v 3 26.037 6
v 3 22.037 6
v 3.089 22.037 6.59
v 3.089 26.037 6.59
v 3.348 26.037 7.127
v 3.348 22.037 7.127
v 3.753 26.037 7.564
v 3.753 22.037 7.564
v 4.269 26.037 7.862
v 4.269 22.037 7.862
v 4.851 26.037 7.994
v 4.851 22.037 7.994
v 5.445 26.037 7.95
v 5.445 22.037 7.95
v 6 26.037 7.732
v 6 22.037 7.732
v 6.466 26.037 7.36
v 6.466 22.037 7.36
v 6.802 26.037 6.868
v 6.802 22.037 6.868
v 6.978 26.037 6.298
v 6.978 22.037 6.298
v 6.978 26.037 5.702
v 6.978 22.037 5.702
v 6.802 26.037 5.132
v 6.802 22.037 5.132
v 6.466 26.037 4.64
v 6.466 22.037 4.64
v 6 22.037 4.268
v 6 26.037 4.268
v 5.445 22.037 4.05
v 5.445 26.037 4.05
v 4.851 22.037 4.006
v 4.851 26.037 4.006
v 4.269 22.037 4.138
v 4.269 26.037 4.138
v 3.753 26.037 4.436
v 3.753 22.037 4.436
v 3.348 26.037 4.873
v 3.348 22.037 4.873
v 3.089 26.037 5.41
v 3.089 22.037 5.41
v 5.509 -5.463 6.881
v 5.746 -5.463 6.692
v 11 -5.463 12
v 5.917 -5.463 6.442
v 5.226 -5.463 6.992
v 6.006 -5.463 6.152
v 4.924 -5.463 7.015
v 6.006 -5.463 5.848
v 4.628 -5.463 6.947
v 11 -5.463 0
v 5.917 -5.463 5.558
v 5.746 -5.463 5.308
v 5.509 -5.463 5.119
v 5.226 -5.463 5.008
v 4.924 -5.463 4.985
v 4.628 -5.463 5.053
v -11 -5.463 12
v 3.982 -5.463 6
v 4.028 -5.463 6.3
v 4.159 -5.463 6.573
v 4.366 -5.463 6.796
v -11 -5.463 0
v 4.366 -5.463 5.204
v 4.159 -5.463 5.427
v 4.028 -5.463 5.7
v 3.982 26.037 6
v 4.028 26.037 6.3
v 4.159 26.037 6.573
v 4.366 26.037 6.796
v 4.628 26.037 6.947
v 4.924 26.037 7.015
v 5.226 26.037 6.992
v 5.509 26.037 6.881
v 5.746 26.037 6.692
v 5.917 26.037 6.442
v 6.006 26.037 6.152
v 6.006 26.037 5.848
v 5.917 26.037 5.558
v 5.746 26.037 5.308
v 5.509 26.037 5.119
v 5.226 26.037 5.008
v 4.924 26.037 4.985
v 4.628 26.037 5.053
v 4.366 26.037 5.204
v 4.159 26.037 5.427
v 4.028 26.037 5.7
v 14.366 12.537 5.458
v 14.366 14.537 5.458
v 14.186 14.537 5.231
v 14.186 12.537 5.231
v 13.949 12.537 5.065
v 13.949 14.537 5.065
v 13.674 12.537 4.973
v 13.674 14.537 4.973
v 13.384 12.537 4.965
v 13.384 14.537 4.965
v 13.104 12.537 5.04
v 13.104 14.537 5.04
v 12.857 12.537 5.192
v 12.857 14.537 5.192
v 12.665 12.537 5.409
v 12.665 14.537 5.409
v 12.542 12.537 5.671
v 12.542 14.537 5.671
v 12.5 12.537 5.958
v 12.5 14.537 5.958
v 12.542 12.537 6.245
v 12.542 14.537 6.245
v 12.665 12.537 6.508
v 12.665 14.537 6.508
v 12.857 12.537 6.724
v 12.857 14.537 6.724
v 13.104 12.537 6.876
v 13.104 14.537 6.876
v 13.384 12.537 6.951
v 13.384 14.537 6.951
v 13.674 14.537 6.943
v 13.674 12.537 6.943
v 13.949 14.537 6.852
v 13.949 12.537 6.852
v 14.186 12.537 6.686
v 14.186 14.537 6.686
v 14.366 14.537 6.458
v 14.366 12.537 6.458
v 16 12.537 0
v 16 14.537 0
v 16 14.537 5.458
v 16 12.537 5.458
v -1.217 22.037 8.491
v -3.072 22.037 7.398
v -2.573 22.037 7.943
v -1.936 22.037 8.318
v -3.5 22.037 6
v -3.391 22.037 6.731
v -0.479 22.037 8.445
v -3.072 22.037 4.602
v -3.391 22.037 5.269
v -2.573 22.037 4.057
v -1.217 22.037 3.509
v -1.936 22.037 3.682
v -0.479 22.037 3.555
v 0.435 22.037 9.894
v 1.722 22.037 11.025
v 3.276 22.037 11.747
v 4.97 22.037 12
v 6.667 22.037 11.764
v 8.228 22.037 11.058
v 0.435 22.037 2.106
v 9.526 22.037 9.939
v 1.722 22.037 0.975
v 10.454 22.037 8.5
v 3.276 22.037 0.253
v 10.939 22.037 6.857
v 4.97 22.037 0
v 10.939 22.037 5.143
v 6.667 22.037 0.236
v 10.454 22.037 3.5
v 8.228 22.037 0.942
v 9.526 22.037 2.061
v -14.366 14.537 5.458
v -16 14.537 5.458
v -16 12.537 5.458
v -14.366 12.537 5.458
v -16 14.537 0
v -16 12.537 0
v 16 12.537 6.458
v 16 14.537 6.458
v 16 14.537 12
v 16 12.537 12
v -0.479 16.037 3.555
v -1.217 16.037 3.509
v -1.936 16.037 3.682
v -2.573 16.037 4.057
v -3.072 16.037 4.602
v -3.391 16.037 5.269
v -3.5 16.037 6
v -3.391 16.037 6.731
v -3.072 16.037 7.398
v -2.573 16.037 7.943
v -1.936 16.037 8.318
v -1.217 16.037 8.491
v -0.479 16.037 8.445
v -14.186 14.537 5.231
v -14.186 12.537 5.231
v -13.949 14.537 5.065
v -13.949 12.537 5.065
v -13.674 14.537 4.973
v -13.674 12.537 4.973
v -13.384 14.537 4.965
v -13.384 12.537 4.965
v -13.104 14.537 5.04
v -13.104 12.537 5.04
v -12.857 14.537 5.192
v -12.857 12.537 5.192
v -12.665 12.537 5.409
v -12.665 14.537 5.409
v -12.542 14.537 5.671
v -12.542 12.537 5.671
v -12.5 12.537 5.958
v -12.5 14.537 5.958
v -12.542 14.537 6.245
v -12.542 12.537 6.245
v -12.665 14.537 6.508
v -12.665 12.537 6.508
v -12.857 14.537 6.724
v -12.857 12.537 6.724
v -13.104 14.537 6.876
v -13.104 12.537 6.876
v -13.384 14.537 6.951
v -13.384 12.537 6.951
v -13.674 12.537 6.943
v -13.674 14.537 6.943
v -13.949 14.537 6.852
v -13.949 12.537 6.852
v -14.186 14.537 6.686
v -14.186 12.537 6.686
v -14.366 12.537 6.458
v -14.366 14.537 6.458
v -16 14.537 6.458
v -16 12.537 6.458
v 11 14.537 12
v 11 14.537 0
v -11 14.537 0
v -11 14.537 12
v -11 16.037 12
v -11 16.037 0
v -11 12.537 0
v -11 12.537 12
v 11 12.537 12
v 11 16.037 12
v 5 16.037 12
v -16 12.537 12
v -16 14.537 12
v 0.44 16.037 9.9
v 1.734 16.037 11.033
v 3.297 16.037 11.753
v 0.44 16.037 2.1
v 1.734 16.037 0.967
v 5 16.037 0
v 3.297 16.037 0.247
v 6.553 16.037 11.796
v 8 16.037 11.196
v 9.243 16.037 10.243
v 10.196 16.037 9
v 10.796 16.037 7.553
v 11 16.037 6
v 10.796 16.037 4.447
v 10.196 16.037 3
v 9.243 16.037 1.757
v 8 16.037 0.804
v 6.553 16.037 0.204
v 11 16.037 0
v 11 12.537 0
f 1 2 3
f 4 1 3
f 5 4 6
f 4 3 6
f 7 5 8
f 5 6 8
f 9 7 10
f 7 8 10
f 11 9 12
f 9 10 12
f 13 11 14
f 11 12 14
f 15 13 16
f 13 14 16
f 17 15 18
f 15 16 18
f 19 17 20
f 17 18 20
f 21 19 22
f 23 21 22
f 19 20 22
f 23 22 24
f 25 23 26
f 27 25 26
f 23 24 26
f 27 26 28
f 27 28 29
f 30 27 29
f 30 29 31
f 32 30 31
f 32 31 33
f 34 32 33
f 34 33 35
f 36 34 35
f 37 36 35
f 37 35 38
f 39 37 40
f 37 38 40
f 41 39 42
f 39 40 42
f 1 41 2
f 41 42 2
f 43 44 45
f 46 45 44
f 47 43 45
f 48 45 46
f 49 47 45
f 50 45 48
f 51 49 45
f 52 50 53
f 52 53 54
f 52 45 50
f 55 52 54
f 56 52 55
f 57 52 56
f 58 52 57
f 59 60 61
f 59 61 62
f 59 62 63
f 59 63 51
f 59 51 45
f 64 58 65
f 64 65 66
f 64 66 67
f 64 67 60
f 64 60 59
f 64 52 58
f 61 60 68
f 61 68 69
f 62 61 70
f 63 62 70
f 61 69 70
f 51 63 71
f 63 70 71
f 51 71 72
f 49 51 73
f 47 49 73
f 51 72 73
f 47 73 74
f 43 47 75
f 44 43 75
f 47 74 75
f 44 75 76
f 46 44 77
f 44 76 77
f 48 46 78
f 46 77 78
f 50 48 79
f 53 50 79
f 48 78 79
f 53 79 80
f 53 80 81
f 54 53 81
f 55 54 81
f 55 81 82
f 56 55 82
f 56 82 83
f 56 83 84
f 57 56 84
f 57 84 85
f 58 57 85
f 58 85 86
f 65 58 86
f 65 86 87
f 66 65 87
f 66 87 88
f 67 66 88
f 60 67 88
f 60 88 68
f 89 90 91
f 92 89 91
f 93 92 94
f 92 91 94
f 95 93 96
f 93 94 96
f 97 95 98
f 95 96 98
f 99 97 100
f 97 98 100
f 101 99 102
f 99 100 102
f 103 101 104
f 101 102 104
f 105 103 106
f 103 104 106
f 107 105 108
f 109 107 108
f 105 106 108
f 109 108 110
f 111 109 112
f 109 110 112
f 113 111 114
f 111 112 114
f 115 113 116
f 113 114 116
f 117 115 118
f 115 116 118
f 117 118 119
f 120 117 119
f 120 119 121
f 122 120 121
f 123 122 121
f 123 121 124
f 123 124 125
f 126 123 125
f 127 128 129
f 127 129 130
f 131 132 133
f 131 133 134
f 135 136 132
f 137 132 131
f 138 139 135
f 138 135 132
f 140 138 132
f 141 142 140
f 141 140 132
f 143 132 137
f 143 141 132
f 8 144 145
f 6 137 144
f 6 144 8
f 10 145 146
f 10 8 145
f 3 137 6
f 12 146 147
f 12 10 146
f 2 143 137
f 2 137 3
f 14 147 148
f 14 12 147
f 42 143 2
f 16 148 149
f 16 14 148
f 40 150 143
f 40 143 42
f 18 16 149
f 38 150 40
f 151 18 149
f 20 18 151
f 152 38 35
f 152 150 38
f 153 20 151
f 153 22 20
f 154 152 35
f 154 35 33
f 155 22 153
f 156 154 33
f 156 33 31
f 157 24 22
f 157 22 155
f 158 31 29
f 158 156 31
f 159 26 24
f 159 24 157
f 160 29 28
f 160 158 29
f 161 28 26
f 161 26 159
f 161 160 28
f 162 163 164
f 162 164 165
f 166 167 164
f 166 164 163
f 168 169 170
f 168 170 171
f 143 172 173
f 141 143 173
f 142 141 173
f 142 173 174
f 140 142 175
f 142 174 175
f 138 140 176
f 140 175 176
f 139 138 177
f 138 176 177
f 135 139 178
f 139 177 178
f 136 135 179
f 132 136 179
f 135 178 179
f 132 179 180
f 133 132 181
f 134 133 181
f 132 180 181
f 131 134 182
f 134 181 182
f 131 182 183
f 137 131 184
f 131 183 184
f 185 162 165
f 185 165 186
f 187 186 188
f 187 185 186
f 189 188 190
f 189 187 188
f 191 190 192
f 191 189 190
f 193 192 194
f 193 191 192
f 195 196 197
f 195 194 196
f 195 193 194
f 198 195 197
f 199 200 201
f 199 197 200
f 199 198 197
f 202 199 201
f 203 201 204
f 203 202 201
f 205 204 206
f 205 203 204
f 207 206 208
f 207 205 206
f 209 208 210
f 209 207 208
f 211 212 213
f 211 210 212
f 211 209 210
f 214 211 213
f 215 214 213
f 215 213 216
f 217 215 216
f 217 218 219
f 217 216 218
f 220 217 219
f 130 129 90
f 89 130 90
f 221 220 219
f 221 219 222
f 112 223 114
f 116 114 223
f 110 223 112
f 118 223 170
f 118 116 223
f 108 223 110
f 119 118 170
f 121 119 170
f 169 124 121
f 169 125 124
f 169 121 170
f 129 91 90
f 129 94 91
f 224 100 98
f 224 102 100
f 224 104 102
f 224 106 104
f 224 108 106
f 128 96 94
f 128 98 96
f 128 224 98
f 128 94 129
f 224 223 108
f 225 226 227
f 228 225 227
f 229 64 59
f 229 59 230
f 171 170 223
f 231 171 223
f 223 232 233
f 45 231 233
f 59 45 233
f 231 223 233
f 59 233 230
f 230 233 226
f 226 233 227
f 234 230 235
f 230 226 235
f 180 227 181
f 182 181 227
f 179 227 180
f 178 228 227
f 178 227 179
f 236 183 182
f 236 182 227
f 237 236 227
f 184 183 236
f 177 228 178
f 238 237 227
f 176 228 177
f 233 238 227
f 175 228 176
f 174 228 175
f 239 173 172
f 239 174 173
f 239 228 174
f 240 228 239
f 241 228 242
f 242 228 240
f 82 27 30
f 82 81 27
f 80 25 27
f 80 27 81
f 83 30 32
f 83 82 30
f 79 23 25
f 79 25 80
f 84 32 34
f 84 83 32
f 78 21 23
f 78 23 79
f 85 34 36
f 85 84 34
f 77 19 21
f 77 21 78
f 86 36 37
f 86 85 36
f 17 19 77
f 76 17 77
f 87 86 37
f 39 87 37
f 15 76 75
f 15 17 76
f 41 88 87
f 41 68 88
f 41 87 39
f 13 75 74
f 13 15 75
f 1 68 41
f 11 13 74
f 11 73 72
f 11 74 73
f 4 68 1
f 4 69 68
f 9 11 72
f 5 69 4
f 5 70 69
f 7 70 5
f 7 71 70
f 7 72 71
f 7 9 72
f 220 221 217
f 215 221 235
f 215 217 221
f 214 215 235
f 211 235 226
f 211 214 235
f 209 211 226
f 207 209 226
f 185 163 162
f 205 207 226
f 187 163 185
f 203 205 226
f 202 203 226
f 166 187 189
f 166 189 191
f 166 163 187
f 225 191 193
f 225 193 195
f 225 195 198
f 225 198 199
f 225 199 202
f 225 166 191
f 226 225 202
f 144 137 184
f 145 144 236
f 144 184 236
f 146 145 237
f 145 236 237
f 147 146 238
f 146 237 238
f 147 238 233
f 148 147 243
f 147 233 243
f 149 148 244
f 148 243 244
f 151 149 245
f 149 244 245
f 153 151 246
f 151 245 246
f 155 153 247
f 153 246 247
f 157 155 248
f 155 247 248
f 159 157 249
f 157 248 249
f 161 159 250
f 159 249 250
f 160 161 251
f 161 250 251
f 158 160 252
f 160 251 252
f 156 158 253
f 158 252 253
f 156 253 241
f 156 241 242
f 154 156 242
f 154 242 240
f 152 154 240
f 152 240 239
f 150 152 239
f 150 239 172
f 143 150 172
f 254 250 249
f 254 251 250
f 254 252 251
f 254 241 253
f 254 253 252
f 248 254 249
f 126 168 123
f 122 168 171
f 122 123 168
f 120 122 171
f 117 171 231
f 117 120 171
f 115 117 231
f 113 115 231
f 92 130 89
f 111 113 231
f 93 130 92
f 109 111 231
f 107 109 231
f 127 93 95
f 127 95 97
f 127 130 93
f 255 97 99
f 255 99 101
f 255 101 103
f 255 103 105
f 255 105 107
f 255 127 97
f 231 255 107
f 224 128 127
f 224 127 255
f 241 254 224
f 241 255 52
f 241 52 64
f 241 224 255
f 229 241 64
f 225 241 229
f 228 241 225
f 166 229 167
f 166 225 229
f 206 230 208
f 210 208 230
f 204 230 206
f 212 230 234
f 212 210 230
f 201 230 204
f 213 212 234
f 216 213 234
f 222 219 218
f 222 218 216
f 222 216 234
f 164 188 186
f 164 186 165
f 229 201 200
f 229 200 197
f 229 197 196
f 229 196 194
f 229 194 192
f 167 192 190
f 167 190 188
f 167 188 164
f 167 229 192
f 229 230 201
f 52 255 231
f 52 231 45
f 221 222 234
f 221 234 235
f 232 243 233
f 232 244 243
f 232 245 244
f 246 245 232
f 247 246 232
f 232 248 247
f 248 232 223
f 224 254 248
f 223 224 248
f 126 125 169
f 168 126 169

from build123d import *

# Parameters (mm, degrees)
EXTRUDE_1_DEPTH     = 12
EXTRUDE_3_DEPTH     = 6
SKETCH_4_R          = 2
EXTRUDE_4_DEPTH     = 4
CUT_EXTRUDE_2_DEPTH = 29.284271247
SKETCH_6_R          = 1.017604249
CUT_EXTRUDE_3_DEPTH = 38.312866414


with BuildPart() as part:
    # 草图1 → 凸台-拉伸1 (new body)
    with BuildSketch(Plane.XY):
        Polygon((-11, 12.536842105), (-16, 12.536842105), (-16, 14.536842105), (-11, 14.536842105), (-11, 16.036842105), (11, 16.036842105), (11, 14.536842105), (16, 14.536842105), (16, 12.536842105), (11, 12.536842105), (11, -5.463157895), (-11, -5.463157895), align=None)
    extrude(amount=EXTRUDE_1_DEPTH)

    # 草图2 → 凸台-拉伸3 (add)
    with BuildSketch(Plane(origin=(0, 16.036842105, 0), x_dir=(1, 0, 0), z_dir=(0, 1, 0))):
        with BuildLine():
            ThreePointArc((-0.479166667, -8.445144707), (11, -6), (-0.479166667, -3.554855293))
            ThreePointArc((-0.479166667, -3.554855293), (-3.5, -6), (-0.479166667, -8.445144707))
        make_face()
    extrude(amount=EXTRUDE_3_DEPTH)

    # 草图4 → 凸台-拉伸4 (add)
    with BuildSketch(Plane(origin=(0, 22.036842105, 0), x_dir=(1, 0, 0), z_dir=(0, 1, 0))):
        with Locations(Location((5, -6, 0), (0, 0, 180))):
            Circle(SKETCH_4_R)
    extrude(amount=EXTRUDE_4_DEPTH)

    # 草图5 → 切除-拉伸2 (cut, through all)
    with BuildSketch(Plane(origin=(0, 14.536842105, 0), x_dir=(-1, 0, 0), z_dir=(0, -1, 0))):
        with BuildLine():
            Line((-14.366025404, -6.458256145), (-16, -6.458256145))
            Line((-16, -6.458256145), (-16, -5.458256145))
            Line((-16, -5.458256145), (-14.366025404, -5.458256145))
            ThreePointArc((-14.366025404, -5.458256145), (-12.5, -5.958256145), (-14.366025404, -6.458256145))
        make_face()
        with BuildLine():
            Line((16, -6.458256145), (16, -5.458256145))
            Line((16, -5.458256145), (14.366025404, -5.458256145))
            ThreePointArc((14.366025404, -5.458256145), (12.5, -5.958256145), (14.366025404, -6.458256145))
            Line((14.366025404, -6.458256145), (16, -6.458256145))
        make_face()
    extrude(amount=CUT_EXTRUDE_2_DEPTH, mode=Mode.SUBTRACT)

    # 草图6 → 切除-拉伸3 (cut, through all)
    with BuildSketch(Plane(origin=(0, 26.036842105, 0), x_dir=(1, 0, 0), z_dir=(0, 1, 0))):
        with Locations(Location((5, -6, 0), (0, 0, 180))):
            Circle(SKETCH_6_R)
    extrude(amount=-CUT_EXTRUDE_3_DEPTH, mode=Mode.SUBTRACT)


solid = part.part
